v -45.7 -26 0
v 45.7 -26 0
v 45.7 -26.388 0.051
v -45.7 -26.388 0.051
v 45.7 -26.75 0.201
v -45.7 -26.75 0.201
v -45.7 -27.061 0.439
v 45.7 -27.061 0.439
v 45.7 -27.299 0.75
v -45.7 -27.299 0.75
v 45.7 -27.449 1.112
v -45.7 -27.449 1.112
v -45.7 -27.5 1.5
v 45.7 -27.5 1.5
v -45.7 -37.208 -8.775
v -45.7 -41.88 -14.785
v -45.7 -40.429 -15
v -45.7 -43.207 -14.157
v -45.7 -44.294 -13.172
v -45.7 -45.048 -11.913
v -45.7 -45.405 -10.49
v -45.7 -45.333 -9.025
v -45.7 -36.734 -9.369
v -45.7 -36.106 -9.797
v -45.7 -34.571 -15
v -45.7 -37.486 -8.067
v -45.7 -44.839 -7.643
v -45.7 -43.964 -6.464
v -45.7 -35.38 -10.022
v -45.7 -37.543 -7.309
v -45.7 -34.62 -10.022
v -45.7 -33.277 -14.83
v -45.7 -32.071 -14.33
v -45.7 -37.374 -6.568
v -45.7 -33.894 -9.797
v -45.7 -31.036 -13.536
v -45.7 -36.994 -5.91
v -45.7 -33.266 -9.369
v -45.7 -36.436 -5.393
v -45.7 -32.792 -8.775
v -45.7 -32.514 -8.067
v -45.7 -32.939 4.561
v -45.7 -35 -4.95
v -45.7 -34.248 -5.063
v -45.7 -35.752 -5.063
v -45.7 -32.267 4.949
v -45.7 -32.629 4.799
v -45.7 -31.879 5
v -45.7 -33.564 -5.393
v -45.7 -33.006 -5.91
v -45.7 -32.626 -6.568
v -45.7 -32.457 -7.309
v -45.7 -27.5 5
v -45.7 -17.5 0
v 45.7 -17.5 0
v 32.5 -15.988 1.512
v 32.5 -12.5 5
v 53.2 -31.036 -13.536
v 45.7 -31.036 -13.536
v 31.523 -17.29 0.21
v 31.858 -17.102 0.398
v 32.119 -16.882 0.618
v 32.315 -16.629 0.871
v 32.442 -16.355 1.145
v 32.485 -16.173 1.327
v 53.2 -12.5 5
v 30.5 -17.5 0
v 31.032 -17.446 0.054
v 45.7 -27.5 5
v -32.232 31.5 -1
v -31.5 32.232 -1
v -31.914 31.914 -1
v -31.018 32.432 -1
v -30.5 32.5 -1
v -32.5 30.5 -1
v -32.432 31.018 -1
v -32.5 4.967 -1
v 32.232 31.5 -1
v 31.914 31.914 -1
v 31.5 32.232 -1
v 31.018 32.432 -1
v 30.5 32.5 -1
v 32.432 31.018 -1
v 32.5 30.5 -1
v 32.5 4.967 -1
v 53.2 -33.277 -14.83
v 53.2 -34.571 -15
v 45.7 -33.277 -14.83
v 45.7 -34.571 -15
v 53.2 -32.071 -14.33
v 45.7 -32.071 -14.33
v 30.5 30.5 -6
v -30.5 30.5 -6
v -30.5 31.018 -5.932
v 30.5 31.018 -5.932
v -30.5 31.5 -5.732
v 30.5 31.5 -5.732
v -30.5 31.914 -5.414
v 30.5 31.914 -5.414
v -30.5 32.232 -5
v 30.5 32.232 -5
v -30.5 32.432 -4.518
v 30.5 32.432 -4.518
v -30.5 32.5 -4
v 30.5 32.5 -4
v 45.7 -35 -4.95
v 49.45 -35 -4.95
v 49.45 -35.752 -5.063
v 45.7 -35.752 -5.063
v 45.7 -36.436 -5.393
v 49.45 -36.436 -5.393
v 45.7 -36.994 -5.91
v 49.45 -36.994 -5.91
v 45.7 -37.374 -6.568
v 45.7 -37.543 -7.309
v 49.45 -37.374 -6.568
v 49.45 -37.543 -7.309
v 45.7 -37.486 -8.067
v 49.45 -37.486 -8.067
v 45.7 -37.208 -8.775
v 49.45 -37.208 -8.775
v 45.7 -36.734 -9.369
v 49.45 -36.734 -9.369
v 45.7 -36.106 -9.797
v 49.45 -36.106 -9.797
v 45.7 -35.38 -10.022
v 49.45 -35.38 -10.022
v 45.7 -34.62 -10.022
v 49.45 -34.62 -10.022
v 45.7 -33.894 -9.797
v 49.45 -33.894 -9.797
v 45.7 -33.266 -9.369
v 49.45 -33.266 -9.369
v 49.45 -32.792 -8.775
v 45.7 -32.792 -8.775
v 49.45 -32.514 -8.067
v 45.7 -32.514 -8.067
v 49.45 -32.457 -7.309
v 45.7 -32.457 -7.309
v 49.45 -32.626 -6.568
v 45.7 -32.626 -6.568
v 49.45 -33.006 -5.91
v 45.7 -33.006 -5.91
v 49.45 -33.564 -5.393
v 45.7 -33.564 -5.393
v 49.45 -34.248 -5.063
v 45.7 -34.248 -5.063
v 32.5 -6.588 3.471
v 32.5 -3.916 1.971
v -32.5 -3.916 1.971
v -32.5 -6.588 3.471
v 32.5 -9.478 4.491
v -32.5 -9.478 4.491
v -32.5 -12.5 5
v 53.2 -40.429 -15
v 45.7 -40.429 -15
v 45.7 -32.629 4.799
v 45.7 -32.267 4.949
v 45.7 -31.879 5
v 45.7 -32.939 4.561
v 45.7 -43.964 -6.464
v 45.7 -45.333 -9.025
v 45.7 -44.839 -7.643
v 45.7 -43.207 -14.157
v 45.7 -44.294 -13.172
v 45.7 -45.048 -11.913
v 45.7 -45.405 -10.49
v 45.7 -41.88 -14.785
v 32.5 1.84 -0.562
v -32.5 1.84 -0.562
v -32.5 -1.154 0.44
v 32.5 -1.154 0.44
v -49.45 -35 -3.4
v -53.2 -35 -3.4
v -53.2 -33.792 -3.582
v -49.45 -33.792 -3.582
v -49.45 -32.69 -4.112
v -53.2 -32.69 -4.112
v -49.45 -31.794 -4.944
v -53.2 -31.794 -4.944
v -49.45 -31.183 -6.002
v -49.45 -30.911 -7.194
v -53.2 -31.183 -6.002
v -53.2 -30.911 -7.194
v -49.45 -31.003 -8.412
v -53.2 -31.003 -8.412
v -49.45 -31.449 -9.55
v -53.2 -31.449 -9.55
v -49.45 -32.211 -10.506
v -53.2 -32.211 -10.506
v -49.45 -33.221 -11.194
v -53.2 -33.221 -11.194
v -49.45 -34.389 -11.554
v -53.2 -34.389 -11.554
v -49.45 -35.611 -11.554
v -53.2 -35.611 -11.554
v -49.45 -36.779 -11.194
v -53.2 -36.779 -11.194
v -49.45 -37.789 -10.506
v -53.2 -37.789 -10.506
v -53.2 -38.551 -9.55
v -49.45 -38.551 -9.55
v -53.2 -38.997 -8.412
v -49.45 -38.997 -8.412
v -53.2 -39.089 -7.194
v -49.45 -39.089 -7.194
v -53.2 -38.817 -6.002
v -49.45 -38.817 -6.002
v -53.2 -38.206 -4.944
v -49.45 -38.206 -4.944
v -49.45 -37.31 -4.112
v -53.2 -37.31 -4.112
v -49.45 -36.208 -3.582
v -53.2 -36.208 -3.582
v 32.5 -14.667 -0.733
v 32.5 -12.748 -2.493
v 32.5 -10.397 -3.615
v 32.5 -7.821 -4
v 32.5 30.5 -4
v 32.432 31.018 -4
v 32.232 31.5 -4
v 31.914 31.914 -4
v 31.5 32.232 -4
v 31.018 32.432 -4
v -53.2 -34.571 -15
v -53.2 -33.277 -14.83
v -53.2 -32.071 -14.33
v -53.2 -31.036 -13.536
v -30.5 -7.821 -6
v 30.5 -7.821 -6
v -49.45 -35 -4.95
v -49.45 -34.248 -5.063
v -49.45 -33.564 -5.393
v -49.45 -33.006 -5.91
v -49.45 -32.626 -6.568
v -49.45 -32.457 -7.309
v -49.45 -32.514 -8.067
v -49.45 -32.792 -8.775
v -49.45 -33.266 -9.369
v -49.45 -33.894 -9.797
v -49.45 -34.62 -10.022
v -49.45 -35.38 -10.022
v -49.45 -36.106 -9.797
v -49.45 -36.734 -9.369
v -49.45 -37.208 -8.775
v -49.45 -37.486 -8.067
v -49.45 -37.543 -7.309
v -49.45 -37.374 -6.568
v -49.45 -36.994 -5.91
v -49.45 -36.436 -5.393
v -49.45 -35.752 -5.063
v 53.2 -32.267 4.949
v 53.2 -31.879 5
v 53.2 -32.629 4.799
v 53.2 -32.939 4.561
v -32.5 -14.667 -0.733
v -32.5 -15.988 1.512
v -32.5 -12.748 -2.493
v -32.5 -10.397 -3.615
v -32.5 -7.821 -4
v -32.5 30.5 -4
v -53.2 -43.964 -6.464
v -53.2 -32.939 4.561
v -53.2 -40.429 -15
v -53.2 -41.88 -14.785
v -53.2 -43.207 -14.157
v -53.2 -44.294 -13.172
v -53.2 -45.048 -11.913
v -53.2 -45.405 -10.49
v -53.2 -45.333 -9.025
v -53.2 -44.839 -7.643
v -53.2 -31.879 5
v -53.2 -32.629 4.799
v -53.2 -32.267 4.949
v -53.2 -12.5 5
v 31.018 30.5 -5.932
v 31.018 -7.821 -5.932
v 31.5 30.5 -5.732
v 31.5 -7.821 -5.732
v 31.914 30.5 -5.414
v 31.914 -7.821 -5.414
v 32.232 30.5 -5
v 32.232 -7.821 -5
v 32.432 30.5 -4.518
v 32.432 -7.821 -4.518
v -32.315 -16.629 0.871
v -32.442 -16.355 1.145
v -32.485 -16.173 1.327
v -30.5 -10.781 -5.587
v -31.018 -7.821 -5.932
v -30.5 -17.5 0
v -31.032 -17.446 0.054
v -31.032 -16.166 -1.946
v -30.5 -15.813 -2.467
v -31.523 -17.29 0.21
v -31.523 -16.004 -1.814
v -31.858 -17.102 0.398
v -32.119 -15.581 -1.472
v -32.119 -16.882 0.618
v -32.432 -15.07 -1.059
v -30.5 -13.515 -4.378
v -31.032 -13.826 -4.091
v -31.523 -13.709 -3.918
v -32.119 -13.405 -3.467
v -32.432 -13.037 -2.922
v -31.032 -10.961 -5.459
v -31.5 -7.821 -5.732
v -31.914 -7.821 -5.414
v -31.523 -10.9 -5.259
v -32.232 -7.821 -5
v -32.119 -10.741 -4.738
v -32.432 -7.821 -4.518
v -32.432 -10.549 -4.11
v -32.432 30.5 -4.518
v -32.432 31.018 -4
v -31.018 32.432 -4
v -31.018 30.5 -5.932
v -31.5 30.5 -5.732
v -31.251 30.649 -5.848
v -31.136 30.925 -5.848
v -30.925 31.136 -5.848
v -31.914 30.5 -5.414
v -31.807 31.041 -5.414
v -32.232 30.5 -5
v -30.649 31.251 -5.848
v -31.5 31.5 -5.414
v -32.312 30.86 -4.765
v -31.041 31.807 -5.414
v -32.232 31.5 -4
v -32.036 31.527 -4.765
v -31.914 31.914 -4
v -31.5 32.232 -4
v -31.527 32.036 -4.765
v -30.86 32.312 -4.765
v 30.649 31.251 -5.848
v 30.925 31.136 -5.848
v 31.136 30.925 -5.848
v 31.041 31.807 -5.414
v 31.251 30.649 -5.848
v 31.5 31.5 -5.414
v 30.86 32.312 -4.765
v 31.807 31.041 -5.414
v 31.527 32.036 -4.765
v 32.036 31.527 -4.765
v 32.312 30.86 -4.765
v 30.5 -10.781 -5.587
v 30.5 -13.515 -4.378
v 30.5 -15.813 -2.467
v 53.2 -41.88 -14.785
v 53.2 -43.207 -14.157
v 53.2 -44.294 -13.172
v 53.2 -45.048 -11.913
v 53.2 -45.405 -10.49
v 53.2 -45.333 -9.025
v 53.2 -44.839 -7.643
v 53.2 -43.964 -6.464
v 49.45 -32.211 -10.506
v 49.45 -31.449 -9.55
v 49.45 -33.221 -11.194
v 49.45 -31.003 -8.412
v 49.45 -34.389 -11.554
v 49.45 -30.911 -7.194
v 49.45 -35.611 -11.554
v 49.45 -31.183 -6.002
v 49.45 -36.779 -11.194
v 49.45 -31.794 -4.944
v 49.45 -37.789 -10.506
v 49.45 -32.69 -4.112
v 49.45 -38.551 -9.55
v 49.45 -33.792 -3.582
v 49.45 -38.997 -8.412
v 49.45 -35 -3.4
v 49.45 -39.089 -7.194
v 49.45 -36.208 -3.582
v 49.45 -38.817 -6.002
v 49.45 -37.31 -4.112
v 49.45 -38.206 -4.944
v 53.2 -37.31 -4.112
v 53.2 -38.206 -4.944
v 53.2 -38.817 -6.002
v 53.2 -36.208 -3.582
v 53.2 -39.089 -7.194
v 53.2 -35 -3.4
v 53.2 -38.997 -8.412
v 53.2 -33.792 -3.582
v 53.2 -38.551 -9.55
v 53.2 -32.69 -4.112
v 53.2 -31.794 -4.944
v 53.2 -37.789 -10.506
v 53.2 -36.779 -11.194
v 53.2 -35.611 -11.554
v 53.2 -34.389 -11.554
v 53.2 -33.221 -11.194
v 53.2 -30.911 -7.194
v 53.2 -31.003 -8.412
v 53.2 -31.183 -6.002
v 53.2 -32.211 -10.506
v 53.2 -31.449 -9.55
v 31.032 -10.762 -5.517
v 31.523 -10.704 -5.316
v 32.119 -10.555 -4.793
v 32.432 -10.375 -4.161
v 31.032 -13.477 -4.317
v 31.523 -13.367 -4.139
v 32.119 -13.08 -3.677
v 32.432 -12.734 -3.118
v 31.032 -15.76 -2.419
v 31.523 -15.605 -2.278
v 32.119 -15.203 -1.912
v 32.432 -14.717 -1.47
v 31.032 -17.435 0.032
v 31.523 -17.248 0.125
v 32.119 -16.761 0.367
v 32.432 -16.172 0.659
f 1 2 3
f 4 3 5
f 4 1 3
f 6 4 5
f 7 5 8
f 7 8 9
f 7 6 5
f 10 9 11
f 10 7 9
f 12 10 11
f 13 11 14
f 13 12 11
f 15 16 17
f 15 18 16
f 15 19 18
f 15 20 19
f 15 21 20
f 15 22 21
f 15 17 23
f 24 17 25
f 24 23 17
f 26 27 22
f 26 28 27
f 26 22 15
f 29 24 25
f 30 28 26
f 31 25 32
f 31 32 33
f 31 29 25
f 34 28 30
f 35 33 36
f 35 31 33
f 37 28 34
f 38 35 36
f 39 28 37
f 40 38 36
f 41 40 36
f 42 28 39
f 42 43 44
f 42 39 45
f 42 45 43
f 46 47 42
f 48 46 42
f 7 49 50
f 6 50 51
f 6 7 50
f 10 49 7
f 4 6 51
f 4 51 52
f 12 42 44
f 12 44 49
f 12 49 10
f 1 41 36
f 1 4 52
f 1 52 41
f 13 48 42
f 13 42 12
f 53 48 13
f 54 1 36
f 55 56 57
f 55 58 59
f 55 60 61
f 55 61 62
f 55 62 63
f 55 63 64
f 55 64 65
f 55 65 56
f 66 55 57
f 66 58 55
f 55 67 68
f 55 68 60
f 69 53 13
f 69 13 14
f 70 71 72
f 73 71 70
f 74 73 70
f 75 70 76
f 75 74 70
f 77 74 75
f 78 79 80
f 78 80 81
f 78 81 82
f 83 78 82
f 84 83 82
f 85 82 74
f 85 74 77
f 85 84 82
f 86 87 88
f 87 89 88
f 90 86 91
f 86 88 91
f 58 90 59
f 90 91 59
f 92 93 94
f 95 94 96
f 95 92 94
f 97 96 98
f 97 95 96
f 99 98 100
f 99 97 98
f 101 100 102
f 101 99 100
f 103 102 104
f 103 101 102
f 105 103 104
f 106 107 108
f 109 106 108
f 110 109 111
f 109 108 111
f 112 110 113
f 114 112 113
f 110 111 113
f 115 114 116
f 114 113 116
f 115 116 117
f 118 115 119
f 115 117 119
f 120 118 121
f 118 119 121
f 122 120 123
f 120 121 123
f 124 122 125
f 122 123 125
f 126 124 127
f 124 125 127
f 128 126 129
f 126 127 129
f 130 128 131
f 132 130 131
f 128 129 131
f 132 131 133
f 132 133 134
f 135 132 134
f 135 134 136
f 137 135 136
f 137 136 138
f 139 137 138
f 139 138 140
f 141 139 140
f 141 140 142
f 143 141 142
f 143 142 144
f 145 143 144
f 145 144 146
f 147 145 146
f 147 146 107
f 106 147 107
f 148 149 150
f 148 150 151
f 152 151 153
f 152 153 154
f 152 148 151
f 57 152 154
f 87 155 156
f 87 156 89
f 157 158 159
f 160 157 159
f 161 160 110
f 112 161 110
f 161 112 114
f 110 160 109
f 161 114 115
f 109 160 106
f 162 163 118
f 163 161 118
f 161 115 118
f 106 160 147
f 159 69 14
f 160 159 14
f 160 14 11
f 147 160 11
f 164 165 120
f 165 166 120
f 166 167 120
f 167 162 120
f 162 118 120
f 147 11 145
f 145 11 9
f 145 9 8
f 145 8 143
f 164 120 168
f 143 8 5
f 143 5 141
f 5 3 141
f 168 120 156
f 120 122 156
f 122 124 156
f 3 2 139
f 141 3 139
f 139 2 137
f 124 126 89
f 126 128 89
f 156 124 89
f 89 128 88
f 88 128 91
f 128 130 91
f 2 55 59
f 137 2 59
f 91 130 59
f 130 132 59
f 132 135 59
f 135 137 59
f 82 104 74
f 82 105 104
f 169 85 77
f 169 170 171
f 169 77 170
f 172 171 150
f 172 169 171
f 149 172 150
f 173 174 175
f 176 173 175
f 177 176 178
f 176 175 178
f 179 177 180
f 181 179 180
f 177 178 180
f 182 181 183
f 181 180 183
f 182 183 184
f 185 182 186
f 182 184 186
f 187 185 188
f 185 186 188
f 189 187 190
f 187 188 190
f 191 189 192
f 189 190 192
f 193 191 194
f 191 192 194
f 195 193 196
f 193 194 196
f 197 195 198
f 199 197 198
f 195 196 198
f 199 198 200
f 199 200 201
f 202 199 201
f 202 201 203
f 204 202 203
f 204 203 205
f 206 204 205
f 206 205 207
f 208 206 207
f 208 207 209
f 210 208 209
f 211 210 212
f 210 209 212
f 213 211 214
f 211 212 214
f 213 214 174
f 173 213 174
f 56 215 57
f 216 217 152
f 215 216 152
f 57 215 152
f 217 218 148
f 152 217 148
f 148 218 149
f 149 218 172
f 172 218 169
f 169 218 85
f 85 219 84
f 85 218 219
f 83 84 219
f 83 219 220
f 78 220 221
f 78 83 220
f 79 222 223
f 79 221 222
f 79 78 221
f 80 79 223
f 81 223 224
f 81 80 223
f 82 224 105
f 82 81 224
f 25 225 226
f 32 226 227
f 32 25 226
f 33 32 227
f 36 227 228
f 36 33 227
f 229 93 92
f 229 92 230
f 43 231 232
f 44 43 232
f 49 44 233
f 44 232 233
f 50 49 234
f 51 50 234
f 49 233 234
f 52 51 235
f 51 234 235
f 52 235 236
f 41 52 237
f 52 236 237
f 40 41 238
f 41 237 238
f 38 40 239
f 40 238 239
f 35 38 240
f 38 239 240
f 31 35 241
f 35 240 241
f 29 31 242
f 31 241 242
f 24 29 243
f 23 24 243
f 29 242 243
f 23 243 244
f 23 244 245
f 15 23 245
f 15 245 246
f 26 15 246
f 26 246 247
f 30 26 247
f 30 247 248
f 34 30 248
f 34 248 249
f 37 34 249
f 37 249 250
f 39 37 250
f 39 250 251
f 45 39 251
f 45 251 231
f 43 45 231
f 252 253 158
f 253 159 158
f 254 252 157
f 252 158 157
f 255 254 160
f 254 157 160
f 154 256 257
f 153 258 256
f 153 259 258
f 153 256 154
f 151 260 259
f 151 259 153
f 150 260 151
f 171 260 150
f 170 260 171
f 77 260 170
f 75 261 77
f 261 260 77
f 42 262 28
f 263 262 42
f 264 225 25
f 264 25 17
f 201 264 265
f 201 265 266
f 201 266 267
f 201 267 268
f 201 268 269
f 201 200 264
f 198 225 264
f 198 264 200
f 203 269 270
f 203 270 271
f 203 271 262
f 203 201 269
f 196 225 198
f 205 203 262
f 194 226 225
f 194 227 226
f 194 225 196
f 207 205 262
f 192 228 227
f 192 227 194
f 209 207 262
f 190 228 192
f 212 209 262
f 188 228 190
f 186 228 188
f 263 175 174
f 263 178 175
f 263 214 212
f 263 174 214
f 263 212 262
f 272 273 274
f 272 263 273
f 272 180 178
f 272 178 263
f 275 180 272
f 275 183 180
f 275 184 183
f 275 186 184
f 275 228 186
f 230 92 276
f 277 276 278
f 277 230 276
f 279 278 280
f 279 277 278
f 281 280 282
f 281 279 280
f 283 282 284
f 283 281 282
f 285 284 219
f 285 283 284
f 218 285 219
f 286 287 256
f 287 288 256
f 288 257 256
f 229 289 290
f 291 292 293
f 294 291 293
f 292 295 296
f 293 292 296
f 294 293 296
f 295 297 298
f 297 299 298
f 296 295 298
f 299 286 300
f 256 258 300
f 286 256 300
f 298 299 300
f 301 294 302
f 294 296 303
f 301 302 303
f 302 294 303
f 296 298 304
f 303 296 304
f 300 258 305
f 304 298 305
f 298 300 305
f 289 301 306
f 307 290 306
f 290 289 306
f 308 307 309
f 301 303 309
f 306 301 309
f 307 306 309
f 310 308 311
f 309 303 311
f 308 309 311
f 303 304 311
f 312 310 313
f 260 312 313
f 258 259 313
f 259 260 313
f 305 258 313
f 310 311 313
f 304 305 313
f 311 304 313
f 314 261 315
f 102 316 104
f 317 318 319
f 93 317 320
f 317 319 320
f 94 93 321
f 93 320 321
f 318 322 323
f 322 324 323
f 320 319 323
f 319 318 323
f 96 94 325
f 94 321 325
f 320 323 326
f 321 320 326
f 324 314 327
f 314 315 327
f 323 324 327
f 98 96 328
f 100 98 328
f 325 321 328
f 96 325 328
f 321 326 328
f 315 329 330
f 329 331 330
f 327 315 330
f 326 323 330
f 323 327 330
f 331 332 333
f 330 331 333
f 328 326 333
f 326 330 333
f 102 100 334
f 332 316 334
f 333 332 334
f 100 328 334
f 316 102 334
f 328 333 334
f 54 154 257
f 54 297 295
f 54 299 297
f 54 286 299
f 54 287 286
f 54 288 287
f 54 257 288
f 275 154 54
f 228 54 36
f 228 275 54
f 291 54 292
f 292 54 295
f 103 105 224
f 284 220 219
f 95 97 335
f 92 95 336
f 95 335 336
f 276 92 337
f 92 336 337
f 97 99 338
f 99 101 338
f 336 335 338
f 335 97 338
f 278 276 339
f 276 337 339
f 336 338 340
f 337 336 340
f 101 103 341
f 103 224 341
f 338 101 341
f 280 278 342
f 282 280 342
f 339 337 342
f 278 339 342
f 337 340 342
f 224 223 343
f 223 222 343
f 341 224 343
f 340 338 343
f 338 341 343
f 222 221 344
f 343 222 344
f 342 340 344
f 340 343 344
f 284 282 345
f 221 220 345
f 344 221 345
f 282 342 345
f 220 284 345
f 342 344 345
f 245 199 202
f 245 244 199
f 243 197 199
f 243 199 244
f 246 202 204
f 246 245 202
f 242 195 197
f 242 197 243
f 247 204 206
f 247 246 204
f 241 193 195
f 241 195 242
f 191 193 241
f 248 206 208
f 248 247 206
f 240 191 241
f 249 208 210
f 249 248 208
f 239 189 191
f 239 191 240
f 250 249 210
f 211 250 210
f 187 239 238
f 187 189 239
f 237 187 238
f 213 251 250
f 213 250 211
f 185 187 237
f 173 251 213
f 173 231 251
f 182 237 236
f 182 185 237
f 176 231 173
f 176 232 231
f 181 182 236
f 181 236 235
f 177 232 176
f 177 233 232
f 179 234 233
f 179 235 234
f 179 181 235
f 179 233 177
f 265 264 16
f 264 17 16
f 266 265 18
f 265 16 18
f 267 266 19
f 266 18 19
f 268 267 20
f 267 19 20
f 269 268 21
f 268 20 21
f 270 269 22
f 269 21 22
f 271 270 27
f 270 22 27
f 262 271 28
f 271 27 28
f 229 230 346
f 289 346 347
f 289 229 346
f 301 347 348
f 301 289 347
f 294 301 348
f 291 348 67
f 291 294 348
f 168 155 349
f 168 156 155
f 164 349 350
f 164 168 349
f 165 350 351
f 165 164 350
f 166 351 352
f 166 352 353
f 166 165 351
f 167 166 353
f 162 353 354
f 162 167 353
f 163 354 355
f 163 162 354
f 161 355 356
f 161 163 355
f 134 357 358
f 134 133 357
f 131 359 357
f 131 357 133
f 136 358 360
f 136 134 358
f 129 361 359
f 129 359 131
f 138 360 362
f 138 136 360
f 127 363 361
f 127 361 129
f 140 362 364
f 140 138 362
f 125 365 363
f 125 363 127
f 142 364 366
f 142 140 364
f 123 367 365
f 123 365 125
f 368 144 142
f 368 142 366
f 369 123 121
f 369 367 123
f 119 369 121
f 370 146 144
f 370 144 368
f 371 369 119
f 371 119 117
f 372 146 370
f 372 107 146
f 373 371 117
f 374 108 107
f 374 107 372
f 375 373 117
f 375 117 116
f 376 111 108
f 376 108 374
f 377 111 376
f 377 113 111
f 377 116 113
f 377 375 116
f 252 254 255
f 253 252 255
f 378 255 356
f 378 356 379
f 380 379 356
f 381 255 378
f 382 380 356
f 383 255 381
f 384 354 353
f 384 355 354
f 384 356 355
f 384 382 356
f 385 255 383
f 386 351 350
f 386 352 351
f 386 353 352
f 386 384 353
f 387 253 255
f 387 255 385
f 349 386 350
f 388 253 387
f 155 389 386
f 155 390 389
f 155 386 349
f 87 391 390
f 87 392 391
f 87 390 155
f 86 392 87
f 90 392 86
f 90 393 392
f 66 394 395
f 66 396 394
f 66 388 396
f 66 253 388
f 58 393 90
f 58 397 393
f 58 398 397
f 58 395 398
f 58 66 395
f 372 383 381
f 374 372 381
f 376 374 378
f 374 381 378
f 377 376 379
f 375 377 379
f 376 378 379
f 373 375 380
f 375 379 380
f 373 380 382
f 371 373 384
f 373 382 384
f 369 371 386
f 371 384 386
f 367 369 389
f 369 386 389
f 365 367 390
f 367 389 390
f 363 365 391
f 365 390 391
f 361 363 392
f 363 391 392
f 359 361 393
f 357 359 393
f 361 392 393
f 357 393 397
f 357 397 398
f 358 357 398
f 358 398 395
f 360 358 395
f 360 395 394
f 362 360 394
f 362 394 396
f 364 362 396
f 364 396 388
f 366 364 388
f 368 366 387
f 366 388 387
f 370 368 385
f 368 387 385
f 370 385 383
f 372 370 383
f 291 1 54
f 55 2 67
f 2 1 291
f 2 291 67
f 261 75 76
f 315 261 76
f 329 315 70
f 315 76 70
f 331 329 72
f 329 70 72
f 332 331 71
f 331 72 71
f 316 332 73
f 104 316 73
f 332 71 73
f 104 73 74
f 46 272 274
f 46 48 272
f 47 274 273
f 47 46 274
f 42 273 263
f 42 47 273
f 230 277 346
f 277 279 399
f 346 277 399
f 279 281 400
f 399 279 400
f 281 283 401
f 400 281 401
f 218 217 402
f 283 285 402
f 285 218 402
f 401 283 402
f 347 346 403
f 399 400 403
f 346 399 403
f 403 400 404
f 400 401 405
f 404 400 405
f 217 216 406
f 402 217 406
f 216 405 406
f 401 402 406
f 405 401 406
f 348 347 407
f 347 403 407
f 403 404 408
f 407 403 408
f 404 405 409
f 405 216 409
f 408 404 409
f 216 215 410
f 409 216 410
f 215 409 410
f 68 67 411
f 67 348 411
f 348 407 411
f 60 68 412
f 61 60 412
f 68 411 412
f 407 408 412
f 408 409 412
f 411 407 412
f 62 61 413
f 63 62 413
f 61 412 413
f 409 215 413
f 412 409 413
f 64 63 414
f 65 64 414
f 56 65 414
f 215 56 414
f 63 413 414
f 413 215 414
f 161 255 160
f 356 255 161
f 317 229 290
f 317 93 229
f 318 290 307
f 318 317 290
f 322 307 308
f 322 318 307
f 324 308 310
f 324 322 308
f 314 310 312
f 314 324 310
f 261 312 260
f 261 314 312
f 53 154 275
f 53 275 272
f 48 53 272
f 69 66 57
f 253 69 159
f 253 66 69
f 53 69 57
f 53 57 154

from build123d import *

# Parameters (mm, degrees)
SKETCH1_W           = 65
SKETCH1_H           = 65
BOSS_EXTRUDE1_DEPTH = 5
BOSS_EXTRUDE3_DEPTH = 7.5
BOSS_EXTRUDE5_DEPTH = 85.7
SKETCH8_R           = 2.55
CUT_EXTRUDE4_DEPTH  = 102.615648401
SKETCH8_3_R         = 4.1
SKETCH8_3_R_2       = 2.55
CUT_EXTRUDE5_DEPTH  = 3.75
SKETCH9_R           = 2.55
BOSS_EXTRUDE6_DEPTH = 7.5
SKETCH10_R          = 4.1
CUT_EXTRUDE6_DEPTH  = 3.75
BOSS_EXTRUDE7_DEPTH = 32.5
CUT_EXTRUDE7_DEPTH  = 32.5
FILLET1_R           = 5
SKETCH14_W          = 91.4
SKETCH14_H          = 5
CUT_EXTRUDE8_DEPTH  = 10
FILLET2_R           = 1.5
FILLET7_R           = 2
BOSS_EXTRUDE9_DEPTH = 65
FILLET9_R           = 2


with BuildPart() as part:
    # Sketch1 → Boss-Extrude1 (new body)
    with BuildSketch(Plane.XY):
        Rectangle(SKETCH1_W, SKETCH1_H)
    extrude(amount=BOSS_EXTRUDE1_DEPTH)



with BuildPart() as body_2:
    # Sketch4 → Boss-Extrude3 (new body)
    with BuildSketch(Plane.ZY.offset(53.2)):
        Polygon((5, -12.5), (-15, -32.5), (-15, -52.5), (5, -32.5), align=None)
    extrude(amount=-BOSS_EXTRUDE3_DEPTH)


with BuildPart() as part_1:
    add(part.part)

    add(body_2.part)  # Boss-Extrude5 merges body 2
    # Sketch7 → Boss-Extrude5 (add)
    with BuildSketch(Plane(origin=(-53.2, 0, 0), x_dir=(0, 0, -1), z_dir=(1, 0, 0))):
        Polygon((-5, -32.5), (0, -32.5), (0, -17.5), (-5, -12.5), align=None)
    boss_extrude5 = extrude(amount=BOSS_EXTRUDE5_DEPTH)

    # Sketch8 → Cut-Extrude4 (cut, through all)
    with BuildSketch(Plane.ZY.offset(53.2)):
        with Locations((-7.5, -35)):
            Circle(SKETCH8_R)
    extrude(amount=-CUT_EXTRUDE4_DEPTH, mode=Mode.SUBTRACT)

    # Sketch8<3> → Cut-Extrude5 (cut)
    with BuildSketch(Plane.ZY.offset(53.2)):
        with Locations((-7.5, -35)):
            Circle(SKETCH8_3_R)
        with Locations((-7.5, -35)):
            Circle(SKETCH8_3_R_2, mode=Mode.SUBTRACT)
    extrude(amount=-CUT_EXTRUDE5_DEPTH, mode=Mode.SUBTRACT)

    # Mirror5: Boss-Extrude5 across plane
    add(boss_extrude5.mirror(Plane(origin=(0, 0, 0), x_dir=(0, 0, 1), z_dir=(1, 0, 0))))

    # Sketch9 → Boss-Extrude6 (add)
    with BuildSketch(Plane(origin=(53.2, 0, 0), x_dir=(0, 0, -1), z_dir=(1, 0, 0))):
        Polygon((0, -17.5), (-5, -12.5), (-5, -32.5), (15, -52.5), (15, -32.5), align=None)
        with Locations(Location((7.5, -35, 0), (0, 0, 180))):
            Circle(SKETCH9_R, mode=Mode.SUBTRACT)
    extrude(amount=-BOSS_EXTRUDE6_DEPTH)

    # Sketch10 → Cut-Extrude6 (cut)
    with BuildSketch(Plane(origin=(53.2, 0, 0), x_dir=(0, 0, -1), z_dir=(1, 0, 0))):
        with Locations(Location((7.5, -35, 0), (0, 0, 180))):
            Circle(SKETCH10_R)
    extrude(amount=-CUT_EXTRUDE6_DEPTH, mode=Mode.SUBTRACT)

    # Sketch11 → Boss-Extrude7 (add, symmetric)
    with BuildSketch(Plane(origin=(0, 0, 0), x_dir=(0, 0, -1), z_dir=(1, 0, 0))):
        with BuildLine():
            Line((-5, -12.5), (-5, -32.5))
            Line((-5, -32.5), (0, -32.5))
            Line((0, -32.5), (0, -17.5))
            ThreePointArc((0, -17.5), (1.245268577, -11.245121626), (3.482006161, -5.272584286))
            ThreePointArc((3.482006161, -5.272584286), (5.362849311, 0.228699546), (6, 6.007603745))
            Line((6, 6.007603745), (6, 32.5))
            Line((6, 32.5), (1, 32.5))
            Line((1, 32.5), (1, 4.967162469))
            ThreePointArc((1, 4.967162469), (0.129503325, 0.320168795), (-1.970810175, -3.915512716))
            ThreePointArc((-1.970810175, -3.915512716), (-4.043682345, -8.010758246), (-5, -12.5))
        make_face()
    extrude(amount=BOSS_EXTRUDE7_DEPTH, both=True)

    # Sketch13 → Cut-Extrude7 (cut, symmetric)
    with BuildSketch(Plane(origin=(0, 0, 0), x_dir=(0, 0, -1), z_dir=(1, 0, 0))):
        with BuildLine():
            ThreePointArc((-1.970810175, -3.915512716), (-4.043682345, -8.010758246), (-5, -12.5))
            Line((-5, -12.5), (-5, 32.5))
            Line((-5, 32.5), (1, 32.5))
            Line((1, 32.5), (1, 4.967162469))
            ThreePointArc((1, 4.967162469), (0.129503325, 0.320168795), (-1.970810175, -3.915512716))
        make_face()
    extrude(amount=CUT_EXTRUDE7_DEPTH, both=True, mode=Mode.SUBTRACT)

    # Fillet1
    fillet1_edges = [part_1.edges().sort_by_distance(p)[0] for p in [
        (-49.45, -32.5, -15),
        (-49.45, -52.5, -15),
        (49.45, -32.5, -15),
        (49.45, -52.5, -15),
    ]]
    fillet(fillet1_edges, radius=FILLET1_R)

    # Sketch14 → Cut-Extrude8 (cut)
    with BuildSketch(Plane.XY.offset(5)):
        with Locations((0, -30)):
            Rectangle(SKETCH14_W, SKETCH14_H)
    extrude(amount=-CUT_EXTRUDE8_DEPTH, mode=Mode.SUBTRACT)

    # Fillet2
    fillet2_edges = [part_1.edges().sort_by_distance(p)[0] for p in [
        (0, -27.5, 0),
        (49.45, -32.5, 5),
        (-49.45, -32.5, 5),
    ]]
    fillet(fillet2_edges, radius=FILLET2_R)

    # Fillet7
    fillet7_edges = [part_1.edges().sort_by_distance(p)[0] for p in [
        (32.5, 32.5, -3.5),
        (-32.5, 32.5, -3.5),
    ]]
    fillet(fillet7_edges, radius=FILLET7_R)

    # Sketch16 → Boss-Extrude9 (add)
    with BuildSketch(Plane.ZY.offset(32.5)):
        with BuildLine():
            Line((-6, 6.007603745), (-6, -7.821383753))
            ThreePointArc((-6, -7.821383753), (-4.378318661, -13.515143769), (0, -17.5))
            Line((0, -17.5), (2.89677664, -14.60322336))
            Line((2.89677664, -14.60322336), (-3.112770549, 6.007603745))
            Line((-3.112770549, 6.007603745), (-6, 6.007603745))
        make_face()
    extrude(amount=-BOSS_EXTRUDE9_DEPTH)

    # Fillet9
    fillet9_edges = [part_1.edges().sort_by_distance(p)[0] for p in [
        (32.5, 11.339308123, -6),
        (-32.5, 11.339308123, -6),
        (0, 32.5, -6),
        (31.914213562, 31.914213562, -6),
        (-31.914213562, 31.914213562, -6),
        (-32.5, -13.515143769, -4.378318661),
        (32.5, -13.515143769, -4.378318661),
    ]]
    fillet(fillet9_edges, radius=FILLET9_R)


solid = part_1.part
